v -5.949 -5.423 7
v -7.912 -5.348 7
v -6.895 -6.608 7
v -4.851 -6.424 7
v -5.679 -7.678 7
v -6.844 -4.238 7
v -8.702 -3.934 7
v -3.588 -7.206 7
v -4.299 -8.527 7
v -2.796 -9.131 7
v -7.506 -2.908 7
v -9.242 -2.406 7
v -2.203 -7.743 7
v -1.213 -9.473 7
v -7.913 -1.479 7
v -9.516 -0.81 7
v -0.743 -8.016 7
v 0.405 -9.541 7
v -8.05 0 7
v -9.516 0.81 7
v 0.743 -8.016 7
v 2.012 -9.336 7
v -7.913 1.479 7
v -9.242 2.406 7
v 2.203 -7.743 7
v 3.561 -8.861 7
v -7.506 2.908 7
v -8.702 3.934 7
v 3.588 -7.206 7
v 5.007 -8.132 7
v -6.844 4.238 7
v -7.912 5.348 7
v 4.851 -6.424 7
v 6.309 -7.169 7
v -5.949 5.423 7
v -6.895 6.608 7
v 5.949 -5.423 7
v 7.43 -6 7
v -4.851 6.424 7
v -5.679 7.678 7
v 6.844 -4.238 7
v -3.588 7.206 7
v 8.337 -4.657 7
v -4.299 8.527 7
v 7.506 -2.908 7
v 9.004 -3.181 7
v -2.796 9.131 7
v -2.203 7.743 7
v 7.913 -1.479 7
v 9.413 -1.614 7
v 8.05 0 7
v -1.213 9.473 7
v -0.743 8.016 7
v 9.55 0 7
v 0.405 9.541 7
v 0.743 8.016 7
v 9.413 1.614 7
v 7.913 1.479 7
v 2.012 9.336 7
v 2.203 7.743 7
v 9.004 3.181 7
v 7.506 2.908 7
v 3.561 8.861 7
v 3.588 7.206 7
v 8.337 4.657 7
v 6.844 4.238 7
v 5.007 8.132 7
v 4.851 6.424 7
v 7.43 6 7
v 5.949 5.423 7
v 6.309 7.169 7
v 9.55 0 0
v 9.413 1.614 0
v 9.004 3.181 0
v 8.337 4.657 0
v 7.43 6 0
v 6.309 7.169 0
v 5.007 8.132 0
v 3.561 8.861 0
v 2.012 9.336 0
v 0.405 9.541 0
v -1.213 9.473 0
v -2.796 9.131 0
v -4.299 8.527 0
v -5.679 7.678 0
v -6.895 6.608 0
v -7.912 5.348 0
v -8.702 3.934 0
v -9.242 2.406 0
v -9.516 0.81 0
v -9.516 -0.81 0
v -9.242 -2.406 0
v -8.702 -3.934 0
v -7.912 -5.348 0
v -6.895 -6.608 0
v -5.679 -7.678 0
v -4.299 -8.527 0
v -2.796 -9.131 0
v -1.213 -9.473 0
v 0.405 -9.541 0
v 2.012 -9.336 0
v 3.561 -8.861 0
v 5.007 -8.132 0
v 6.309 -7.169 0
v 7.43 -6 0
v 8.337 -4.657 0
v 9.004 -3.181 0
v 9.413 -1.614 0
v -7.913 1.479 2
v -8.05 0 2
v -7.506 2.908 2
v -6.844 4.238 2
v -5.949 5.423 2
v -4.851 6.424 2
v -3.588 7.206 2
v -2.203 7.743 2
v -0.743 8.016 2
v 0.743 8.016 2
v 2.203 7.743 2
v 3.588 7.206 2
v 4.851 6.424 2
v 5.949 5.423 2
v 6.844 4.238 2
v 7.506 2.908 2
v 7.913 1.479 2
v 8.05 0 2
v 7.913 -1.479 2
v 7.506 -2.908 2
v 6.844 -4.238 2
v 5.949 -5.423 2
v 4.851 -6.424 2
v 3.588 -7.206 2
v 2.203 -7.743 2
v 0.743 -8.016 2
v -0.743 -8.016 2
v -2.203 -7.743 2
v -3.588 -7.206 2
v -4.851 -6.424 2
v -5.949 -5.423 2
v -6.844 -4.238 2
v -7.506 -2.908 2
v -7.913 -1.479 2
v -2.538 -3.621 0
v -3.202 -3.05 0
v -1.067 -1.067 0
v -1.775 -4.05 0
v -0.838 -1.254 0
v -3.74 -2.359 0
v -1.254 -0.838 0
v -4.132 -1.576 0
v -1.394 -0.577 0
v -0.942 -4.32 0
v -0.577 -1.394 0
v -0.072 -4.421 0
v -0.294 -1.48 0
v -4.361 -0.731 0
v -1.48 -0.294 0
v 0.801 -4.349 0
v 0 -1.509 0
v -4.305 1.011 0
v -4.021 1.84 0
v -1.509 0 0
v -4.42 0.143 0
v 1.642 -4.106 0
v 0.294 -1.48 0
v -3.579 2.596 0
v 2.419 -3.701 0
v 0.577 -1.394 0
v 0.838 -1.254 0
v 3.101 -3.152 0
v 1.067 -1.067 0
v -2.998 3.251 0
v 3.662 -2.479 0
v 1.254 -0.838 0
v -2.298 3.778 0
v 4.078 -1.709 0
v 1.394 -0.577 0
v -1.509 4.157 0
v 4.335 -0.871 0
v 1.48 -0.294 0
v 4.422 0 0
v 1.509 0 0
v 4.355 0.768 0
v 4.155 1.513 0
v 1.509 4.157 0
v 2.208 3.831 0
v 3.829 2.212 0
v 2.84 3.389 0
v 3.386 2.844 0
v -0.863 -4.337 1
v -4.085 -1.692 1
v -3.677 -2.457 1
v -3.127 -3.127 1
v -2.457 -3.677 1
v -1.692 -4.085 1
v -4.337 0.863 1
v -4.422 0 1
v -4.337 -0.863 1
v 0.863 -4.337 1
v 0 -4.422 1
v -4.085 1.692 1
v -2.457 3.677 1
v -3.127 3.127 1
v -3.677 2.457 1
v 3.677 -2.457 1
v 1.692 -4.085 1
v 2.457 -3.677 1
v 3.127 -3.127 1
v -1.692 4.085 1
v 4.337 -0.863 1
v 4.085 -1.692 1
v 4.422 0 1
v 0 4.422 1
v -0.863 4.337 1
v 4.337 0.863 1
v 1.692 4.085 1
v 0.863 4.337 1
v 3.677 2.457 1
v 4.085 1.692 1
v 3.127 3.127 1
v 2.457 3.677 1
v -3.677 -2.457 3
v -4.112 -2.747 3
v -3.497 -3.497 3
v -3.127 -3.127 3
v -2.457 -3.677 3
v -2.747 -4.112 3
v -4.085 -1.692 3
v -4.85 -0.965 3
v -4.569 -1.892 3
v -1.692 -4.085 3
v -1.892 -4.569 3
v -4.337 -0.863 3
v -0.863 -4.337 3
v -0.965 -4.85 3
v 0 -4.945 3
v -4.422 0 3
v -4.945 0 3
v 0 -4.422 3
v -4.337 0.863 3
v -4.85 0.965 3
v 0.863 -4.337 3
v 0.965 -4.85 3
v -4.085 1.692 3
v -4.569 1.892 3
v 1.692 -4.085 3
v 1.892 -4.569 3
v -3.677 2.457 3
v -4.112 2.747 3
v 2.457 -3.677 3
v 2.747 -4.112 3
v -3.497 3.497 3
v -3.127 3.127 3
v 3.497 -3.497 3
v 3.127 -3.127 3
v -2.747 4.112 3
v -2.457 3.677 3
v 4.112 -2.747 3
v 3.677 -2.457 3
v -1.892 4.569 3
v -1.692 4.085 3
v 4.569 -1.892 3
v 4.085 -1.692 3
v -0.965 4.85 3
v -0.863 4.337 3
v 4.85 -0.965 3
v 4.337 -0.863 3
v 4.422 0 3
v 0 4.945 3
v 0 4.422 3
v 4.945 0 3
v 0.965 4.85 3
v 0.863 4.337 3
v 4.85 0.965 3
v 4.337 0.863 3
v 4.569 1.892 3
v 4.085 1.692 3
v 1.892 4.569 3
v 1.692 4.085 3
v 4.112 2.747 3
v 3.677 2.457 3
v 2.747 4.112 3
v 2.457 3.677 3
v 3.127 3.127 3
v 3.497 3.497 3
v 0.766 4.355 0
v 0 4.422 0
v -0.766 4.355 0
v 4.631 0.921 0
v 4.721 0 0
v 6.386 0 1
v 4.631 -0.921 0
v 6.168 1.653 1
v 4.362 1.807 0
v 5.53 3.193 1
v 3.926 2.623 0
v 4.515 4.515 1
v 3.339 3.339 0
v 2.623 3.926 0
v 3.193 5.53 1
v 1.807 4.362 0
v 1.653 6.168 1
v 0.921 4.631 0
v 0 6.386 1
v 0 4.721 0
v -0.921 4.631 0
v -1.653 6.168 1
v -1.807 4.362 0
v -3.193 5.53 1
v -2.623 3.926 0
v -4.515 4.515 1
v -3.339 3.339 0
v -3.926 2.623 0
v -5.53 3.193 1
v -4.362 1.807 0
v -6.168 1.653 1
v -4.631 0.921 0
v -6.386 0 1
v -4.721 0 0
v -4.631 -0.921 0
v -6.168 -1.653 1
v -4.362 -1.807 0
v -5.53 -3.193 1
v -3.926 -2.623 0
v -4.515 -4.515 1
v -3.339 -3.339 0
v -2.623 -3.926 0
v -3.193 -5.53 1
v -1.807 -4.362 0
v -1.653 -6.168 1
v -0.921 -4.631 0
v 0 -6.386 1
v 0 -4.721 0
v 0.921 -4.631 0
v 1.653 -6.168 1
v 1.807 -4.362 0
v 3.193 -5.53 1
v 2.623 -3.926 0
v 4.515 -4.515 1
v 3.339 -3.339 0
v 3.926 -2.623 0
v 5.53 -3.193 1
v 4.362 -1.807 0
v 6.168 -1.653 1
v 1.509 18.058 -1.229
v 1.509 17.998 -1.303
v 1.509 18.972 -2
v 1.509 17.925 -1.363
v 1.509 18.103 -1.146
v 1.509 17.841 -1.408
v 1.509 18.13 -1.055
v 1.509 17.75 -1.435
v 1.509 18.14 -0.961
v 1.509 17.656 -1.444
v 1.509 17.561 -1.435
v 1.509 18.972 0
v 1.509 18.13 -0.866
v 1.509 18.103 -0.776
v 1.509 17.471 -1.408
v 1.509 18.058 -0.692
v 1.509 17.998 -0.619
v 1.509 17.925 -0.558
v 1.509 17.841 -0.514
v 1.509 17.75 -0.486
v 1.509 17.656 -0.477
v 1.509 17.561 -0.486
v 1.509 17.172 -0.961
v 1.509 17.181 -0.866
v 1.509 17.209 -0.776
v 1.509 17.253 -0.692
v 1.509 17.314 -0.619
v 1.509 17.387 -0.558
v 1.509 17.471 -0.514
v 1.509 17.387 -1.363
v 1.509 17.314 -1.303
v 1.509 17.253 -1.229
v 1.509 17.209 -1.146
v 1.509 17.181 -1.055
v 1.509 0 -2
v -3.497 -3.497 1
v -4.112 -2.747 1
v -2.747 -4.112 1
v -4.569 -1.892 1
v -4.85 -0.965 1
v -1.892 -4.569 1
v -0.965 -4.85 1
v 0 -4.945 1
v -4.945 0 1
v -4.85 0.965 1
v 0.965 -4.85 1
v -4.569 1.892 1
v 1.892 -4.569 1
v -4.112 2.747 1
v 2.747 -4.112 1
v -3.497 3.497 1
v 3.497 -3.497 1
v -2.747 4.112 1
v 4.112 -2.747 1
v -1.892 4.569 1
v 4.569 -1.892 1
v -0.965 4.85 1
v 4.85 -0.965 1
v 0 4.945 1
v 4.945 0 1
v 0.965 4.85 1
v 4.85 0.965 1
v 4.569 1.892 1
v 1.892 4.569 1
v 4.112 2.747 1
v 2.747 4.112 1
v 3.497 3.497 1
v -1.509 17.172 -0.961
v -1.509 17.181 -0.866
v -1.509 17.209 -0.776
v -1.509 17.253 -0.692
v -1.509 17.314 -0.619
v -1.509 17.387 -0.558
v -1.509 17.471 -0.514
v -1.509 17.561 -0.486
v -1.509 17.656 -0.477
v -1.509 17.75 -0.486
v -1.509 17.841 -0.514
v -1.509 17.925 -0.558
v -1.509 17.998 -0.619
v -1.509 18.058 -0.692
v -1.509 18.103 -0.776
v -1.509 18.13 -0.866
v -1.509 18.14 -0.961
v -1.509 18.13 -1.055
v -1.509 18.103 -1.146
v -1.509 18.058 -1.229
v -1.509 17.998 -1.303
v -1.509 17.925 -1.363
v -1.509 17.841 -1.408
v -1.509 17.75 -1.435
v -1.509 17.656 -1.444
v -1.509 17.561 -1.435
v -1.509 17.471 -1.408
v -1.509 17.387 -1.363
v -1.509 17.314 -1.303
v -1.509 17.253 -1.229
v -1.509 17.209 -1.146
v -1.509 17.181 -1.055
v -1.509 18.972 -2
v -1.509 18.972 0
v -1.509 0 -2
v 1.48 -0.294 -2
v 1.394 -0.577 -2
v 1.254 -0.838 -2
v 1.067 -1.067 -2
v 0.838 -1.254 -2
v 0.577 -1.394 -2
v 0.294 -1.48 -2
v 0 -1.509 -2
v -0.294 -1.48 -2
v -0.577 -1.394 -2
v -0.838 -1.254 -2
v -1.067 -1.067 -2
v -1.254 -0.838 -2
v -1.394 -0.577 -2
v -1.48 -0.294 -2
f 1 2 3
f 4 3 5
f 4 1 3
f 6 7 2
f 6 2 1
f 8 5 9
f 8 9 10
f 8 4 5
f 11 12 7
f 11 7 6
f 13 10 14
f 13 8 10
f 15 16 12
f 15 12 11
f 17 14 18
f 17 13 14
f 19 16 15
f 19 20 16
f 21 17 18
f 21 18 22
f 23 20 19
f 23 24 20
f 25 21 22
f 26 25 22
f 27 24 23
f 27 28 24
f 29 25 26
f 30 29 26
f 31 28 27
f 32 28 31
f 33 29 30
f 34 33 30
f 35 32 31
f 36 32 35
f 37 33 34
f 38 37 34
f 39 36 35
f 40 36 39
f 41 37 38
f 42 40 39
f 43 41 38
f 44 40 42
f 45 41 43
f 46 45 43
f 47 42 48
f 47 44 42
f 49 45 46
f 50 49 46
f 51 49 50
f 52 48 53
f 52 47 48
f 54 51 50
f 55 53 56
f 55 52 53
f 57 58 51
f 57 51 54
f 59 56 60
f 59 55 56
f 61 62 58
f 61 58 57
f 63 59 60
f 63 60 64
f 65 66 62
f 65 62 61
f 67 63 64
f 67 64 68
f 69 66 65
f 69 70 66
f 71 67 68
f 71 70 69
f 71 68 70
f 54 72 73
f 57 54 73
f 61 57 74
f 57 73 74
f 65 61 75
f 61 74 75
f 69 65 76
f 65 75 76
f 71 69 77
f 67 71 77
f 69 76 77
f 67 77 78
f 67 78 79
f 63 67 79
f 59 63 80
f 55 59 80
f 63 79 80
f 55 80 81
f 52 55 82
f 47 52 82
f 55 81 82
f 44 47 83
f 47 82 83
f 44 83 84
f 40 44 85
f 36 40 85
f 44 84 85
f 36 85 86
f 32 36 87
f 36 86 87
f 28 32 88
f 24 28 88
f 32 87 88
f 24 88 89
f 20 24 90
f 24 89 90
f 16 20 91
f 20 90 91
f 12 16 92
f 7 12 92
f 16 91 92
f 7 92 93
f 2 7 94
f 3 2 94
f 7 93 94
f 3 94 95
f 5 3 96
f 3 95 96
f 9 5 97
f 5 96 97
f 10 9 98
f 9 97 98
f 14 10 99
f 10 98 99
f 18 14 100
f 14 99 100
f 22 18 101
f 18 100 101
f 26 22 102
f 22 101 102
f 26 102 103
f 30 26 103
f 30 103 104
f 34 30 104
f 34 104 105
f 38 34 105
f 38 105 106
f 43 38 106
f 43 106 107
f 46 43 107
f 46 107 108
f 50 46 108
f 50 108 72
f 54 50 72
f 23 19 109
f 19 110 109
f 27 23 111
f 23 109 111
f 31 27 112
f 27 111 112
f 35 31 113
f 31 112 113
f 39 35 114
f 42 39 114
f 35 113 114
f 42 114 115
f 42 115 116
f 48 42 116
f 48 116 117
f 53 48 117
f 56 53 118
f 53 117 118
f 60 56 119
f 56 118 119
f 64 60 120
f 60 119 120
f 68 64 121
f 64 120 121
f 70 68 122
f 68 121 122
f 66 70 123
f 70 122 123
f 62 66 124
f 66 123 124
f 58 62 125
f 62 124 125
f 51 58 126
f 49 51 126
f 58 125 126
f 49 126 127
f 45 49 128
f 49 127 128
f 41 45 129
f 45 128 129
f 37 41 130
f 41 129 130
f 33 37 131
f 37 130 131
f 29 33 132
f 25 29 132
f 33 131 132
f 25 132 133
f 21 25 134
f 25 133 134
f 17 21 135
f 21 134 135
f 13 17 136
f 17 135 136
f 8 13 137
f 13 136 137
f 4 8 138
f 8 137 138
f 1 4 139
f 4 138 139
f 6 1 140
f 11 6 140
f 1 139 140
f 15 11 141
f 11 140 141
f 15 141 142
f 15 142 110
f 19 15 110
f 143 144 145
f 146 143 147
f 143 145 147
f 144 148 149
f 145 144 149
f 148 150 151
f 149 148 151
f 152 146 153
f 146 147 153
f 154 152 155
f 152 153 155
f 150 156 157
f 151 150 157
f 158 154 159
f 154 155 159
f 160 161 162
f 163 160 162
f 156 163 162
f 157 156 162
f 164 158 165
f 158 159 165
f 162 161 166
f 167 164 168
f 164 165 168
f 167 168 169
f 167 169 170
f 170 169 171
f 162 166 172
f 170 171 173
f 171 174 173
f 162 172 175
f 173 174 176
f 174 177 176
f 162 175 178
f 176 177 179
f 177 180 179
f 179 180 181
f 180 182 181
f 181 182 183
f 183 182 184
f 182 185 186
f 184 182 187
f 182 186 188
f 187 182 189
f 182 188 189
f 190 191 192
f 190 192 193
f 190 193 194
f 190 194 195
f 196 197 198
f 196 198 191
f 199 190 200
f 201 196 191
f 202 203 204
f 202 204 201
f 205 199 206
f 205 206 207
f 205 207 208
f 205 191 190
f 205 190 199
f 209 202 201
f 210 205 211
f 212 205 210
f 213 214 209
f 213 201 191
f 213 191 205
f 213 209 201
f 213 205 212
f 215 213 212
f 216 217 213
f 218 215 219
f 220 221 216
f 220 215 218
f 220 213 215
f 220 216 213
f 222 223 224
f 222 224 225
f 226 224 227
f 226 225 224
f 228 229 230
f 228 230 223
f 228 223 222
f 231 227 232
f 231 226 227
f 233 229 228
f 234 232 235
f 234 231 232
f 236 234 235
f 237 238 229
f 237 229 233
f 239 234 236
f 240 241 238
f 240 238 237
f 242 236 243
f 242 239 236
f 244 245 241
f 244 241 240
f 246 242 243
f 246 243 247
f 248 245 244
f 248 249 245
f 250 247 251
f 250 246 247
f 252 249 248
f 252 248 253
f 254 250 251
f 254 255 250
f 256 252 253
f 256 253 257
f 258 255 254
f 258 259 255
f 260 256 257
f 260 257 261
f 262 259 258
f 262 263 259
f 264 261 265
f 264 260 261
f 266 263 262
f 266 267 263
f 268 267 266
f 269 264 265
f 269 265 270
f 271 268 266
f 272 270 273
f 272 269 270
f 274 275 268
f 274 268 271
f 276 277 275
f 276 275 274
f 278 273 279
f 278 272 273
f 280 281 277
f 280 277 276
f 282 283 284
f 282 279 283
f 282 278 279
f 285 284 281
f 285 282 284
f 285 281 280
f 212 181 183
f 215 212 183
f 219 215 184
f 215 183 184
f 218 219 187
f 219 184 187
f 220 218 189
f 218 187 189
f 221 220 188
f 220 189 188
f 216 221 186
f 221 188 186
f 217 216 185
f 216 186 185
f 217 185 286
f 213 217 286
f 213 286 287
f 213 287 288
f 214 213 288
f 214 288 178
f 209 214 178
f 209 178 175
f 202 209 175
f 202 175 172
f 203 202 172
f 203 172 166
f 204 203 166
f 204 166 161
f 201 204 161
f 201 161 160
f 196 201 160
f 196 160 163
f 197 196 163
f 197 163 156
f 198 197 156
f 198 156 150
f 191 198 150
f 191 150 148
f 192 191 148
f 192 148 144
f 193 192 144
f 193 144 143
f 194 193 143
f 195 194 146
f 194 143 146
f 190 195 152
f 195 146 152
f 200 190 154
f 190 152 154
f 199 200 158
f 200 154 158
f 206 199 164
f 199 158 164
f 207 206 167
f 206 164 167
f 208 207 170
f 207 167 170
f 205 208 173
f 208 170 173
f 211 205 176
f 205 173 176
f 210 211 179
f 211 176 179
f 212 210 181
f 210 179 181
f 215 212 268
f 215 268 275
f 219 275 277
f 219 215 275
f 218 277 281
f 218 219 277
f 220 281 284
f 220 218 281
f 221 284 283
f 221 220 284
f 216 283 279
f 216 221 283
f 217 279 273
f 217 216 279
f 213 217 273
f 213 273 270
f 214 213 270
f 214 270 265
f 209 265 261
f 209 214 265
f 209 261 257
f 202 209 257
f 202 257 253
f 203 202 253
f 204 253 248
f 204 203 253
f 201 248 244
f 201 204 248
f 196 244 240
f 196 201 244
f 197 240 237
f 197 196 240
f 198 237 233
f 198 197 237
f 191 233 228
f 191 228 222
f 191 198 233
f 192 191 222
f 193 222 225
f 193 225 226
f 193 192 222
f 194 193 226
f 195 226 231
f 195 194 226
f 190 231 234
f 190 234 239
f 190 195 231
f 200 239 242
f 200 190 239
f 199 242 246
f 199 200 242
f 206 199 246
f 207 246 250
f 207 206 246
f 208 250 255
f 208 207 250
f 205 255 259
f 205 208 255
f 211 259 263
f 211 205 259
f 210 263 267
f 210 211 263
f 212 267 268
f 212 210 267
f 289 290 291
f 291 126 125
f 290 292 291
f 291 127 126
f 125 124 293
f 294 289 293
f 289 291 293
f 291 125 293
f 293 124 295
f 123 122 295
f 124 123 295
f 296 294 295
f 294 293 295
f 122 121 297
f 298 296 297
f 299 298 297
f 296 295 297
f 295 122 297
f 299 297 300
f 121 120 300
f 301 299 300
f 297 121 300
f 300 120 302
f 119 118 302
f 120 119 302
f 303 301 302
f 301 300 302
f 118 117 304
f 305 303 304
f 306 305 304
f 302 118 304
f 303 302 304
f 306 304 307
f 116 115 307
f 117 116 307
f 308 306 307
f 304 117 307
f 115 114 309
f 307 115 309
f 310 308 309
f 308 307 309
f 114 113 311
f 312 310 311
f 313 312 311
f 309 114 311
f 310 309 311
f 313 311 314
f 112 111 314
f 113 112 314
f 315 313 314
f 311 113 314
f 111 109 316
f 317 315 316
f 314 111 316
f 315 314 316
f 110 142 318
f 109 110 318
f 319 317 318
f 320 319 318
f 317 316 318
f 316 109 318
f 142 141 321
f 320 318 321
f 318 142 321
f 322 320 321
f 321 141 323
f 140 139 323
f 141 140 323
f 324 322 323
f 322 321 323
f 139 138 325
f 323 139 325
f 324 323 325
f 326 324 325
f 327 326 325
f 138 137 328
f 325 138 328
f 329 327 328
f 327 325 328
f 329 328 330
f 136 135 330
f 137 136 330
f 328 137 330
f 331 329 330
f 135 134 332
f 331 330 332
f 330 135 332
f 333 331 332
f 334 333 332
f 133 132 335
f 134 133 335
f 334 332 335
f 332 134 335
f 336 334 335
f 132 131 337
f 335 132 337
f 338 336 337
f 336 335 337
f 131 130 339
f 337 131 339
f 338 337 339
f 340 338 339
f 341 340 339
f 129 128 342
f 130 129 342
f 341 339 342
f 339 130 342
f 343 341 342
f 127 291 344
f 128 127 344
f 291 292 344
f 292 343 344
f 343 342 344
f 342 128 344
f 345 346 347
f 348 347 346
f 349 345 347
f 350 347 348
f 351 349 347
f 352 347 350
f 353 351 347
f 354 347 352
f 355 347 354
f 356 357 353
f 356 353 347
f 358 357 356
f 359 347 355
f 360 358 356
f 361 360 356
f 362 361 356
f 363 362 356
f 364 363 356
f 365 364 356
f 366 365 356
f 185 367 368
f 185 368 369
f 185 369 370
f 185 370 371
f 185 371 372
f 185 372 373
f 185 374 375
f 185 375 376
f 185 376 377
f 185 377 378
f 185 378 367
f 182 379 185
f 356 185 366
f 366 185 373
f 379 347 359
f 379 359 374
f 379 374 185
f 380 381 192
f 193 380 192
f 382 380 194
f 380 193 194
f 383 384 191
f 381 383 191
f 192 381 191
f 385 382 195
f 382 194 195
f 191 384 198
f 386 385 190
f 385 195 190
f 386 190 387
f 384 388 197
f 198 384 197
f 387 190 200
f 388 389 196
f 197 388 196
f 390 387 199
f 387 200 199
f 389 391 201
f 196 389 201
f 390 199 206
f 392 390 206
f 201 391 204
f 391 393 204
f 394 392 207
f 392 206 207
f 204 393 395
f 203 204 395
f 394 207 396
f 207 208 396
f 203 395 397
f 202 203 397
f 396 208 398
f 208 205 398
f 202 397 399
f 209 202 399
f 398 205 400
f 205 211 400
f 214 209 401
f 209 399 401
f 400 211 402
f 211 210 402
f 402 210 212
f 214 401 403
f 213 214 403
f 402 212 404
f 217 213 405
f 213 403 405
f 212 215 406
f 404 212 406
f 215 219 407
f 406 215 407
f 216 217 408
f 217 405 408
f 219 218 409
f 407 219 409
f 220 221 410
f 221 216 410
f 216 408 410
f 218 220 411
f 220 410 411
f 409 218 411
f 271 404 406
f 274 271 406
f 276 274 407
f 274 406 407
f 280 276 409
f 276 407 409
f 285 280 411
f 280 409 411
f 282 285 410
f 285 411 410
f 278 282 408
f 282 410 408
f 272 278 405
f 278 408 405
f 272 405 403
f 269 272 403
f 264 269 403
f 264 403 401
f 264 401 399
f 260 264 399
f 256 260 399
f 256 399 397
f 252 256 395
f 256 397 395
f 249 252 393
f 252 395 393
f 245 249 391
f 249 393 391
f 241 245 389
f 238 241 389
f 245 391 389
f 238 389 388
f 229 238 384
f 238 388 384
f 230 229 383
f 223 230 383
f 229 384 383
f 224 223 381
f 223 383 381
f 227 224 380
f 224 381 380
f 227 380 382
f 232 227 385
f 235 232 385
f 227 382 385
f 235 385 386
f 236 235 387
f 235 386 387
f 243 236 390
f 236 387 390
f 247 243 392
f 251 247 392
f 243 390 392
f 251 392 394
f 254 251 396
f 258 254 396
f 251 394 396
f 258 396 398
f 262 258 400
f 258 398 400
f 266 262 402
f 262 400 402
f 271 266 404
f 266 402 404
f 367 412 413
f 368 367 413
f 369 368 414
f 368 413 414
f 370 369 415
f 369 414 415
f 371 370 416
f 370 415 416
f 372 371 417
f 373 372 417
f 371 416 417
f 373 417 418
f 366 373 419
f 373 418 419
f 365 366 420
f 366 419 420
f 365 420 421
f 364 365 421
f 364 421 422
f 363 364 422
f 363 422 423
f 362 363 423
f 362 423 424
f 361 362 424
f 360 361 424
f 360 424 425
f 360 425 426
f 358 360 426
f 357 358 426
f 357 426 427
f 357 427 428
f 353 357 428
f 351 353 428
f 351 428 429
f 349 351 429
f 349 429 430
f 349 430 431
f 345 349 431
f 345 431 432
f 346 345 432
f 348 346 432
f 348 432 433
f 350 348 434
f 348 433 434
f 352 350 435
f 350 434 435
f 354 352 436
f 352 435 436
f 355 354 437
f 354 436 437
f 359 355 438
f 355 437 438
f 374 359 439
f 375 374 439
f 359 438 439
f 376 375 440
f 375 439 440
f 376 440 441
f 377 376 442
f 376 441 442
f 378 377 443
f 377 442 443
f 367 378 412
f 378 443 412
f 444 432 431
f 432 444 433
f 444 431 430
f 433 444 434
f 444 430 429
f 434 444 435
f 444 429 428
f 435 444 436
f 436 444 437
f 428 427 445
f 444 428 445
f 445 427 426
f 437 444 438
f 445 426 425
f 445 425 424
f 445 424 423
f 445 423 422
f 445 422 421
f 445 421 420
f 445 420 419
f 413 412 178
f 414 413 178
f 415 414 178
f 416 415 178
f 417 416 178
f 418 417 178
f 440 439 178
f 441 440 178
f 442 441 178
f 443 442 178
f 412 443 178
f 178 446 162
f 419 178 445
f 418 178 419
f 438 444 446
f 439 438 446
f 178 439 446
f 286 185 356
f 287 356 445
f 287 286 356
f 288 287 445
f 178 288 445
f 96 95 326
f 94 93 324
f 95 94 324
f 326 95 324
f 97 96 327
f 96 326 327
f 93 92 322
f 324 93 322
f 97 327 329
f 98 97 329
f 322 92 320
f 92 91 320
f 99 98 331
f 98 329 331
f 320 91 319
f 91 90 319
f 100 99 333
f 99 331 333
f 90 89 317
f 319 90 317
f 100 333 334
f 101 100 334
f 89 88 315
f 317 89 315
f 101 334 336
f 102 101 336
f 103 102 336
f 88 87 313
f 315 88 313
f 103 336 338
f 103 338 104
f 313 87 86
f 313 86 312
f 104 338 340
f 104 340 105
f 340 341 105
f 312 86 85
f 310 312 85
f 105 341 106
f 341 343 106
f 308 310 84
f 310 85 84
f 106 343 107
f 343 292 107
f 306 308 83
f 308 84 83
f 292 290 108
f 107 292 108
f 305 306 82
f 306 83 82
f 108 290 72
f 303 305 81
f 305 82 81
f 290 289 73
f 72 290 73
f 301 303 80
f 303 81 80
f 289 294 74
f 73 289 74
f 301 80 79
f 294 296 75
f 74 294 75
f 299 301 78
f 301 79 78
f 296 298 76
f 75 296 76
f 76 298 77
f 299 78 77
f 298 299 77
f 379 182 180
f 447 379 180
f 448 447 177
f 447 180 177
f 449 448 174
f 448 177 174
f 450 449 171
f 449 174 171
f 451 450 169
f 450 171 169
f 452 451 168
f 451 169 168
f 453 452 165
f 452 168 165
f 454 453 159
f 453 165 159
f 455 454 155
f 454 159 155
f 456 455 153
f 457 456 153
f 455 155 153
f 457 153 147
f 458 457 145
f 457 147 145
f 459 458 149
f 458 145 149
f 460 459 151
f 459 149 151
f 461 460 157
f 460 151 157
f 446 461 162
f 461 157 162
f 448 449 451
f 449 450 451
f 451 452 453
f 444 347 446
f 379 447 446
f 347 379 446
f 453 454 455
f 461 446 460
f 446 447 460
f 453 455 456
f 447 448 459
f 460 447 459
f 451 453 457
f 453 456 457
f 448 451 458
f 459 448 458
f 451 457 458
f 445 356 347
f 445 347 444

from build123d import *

# Parameters (mm, degrees)
F0_R      = 9.55
F1_DEPTH  = 7
F3_D      = 16.1
F3_DEPTH  = 5
F3_TIP    = 4.8369279832
F4_R      = 4.4218662577
F5_DEPTH  = 1
F6_R      = 4.9450532924
F6_R_2    = 4.4218662577
F7_DEPTH  = 2
F9_DEPTH  = 2
F10_W     = 3.0172600184
F10_H     = 2
F11_DEPTH = 15
F13_R     = 0.4837890582
F14_DEPTH = 25


with BuildPart() as f1:
    # F0 (on Top) → F1 (new body)
    with BuildSketch(Plane.XY):
        Circle(F0_R)
    extrude(amount=F1_DEPTH)

    # F3
    with Locations(Plane.XY.offset(7)):
        with Locations((0, 0)):
            Hole(F3_D / 2, depth=F3_DEPTH)
            with Locations((0, 0, -(F3_DEPTH + F3_TIP / 2))):  # 118° drill point
                Cone(0, F3_D / 2, F3_TIP, mode=Mode.SUBTRACT)


with BuildPart() as f5:
    # F4 (on Top) → F5 (new body)
    with BuildSketch(Plane.XY):
        Circle(F4_R)
    extrude(amount=F5_DEPTH)

    # F8 (on face) → F9 (join)
    with BuildSketch(Plane(origin=(0, 0, 0), x_dir=(1, 0, 0), z_dir=(0, 0, -1))):
        with BuildLine():
            ThreePointArc((-1.5086300092, 0), (0, -1.5086300092), (1.5086300092, 0))
            ThreePointArc((1.5086300092, 0), (0, 1.5086300092), (-1.5086300092, 0))
        make_face()
        with BuildLine():
            Line((1.5086300092, -3.9720046334), (1.5086300092, 0))
            ThreePointArc((1.5086300092, 0), (0, -1.5086300092), (-1.5086300092, 0))
            Line((-1.5086300092, 0), (-1.5086300092, -3.9720046334))
            Line((-1.5086300092, -3.9720046334), (1.5086300092, -3.9720046334))
        make_face()
    extrude(amount=F9_DEPTH)


with BuildPart() as f7:
    # F6 (on face) → F7 (new body)
    with BuildSketch(Plane.XY.offset(1)):
        Circle(F6_R)
        Circle(F6_R_2, mode=Mode.SUBTRACT)
    extrude(amount=F7_DEPTH)


with BuildPart() as f11:
    # F10 (on face) → F11 (new body)
    with BuildSketch(Plane(origin=(0, 3.9720046334, 0), x_dir=(-1, 0, 0), z_dir=(0, 1, 0))):
        with Locations((0, -1)):
            Rectangle(F10_W, F10_H)
    extrude(amount=F11_DEPTH)


with BuildPart() as f5_1:
    add(f5.part)

    # F12: union F11, F7
    add(f11.part)
    add(f7.part)

    # F13 (on face) → F14 (cut)
    with BuildSketch(Plane(origin=(-1.5086300092, 0, 0), x_dir=(0, -1, 0), z_dir=(-1, 0, 0))):
        with Locations((-17.6557358354, -0.9606761741)):
            Circle(F13_R)
    extrude(amount=-F14_DEPTH, mode=Mode.SUBTRACT)


solid = Compound([f1.part, f5_1.part])
